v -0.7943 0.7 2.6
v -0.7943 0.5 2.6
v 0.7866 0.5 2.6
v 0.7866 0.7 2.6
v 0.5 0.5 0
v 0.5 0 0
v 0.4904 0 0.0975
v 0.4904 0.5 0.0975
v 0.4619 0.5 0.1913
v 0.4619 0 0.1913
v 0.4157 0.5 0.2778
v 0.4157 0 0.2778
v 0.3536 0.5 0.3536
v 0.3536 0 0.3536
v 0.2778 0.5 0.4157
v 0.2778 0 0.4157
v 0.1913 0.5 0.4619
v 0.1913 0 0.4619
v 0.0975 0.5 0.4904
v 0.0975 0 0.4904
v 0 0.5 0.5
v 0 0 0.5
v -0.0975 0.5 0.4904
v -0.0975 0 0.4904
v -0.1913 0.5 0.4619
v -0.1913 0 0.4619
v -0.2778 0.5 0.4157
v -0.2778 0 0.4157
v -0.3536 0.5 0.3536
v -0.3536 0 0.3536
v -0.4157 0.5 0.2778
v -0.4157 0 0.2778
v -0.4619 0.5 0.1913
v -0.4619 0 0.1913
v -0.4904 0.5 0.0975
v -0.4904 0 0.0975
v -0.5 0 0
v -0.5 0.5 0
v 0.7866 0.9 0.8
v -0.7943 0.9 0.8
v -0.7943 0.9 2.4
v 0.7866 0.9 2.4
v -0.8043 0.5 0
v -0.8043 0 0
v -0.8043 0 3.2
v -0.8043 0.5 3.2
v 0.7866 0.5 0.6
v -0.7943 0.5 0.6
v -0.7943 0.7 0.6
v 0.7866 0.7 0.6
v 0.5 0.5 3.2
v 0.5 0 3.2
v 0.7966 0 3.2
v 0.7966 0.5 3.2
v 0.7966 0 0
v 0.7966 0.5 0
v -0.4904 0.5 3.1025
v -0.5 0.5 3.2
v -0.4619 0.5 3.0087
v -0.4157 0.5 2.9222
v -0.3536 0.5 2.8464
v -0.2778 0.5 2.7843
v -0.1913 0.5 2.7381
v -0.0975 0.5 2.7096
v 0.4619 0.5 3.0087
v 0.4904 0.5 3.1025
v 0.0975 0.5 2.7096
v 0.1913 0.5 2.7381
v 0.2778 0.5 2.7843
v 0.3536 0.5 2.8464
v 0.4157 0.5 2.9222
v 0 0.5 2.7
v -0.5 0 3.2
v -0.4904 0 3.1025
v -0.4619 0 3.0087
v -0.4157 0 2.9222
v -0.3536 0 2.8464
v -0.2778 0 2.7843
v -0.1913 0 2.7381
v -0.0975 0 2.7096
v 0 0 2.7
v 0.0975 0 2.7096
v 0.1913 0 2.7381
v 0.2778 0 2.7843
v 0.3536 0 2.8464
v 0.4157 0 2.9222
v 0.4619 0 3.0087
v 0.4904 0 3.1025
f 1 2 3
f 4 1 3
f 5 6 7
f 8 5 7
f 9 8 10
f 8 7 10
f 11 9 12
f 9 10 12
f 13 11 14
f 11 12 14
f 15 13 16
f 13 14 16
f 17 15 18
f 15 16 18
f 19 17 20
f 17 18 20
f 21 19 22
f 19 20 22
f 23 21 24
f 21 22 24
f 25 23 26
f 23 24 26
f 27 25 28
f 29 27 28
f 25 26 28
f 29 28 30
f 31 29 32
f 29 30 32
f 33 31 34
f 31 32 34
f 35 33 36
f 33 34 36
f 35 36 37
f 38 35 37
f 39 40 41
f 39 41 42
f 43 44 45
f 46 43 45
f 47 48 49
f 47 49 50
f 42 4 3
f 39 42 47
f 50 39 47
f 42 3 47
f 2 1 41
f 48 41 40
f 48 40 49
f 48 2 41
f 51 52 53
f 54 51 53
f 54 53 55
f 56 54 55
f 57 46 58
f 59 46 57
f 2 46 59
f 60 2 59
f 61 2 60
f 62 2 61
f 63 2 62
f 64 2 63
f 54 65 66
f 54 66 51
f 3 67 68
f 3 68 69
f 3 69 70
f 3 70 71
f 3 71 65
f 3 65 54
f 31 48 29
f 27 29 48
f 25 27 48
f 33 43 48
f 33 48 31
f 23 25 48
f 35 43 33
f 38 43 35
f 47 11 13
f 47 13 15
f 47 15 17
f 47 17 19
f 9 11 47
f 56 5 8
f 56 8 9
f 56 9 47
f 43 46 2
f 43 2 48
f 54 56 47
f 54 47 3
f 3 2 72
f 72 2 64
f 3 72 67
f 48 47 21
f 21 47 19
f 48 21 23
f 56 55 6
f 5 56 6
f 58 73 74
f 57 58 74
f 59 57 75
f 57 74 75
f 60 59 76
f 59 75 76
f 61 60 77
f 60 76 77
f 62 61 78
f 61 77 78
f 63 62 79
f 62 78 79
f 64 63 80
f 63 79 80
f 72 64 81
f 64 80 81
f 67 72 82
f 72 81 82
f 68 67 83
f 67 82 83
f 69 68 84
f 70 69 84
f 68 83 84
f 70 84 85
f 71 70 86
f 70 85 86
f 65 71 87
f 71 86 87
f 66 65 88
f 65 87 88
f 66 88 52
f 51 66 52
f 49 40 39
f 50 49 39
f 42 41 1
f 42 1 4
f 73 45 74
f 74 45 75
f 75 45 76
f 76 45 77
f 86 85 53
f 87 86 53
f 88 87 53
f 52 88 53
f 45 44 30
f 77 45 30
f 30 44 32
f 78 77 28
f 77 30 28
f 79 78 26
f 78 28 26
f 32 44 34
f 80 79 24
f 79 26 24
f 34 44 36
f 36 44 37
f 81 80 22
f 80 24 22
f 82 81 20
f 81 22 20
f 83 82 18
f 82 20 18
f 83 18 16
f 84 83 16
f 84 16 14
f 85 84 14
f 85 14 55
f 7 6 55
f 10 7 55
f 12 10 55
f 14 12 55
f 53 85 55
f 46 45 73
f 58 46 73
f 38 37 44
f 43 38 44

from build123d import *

# Parameters (mm, degrees)
BOSS_EXTRUDE1_DEPTH = 0.5
SKETCH2_W           = 1.580979229
SKETCH2_H           = 2
BOSS_EXTRUDE3_DEPTH = 0.4
CHAMFER2_SIZE       = 0.2


with BuildPart() as part:
    # Sketch1 → Boss-Extrude1 (new body)
    with BuildSketch(Plane(origin=(0, 0, 0), x_dir=(1, 0, 0), z_dir=(0, 1, 0))):
        with BuildLine():
            Line((-0.5, 0), (-0.804342602, 0))
            Line((-0.804342602, 0), (-0.804342602, -3.2))
            Line((-0.804342602, -3.2), (-0.5, -3.2))
            ThreePointArc((-0.5, -3.2), (0, -2.7), (0.5, -3.2))
            Line((0.5, -3.2), (0.796636627, -3.2))
            Line((0.796636627, -3.2), (0.796636627, 0))
            Line((0.796636627, 0), (0.5, 0))
            ThreePointArc((0.5, 0), (0, -0.5), (-0.5, 0))
        make_face()
    extrude(amount=BOSS_EXTRUDE1_DEPTH)

    # Sketch2 → Boss-Extrude3 (add)
    with BuildSketch(Plane(origin=(0, 0.5, 0), x_dir=(1, 0, 0), z_dir=(0, 1, 0))):
        with Locations((-0.003852988, -1.6)):
            Rectangle(SKETCH2_W, SKETCH2_H)
    extrude(amount=BOSS_EXTRUDE3_DEPTH)

    # Chamfer2
    chamfer2_edges = [part.edges().sort_by_distance(p)[0] for p in [
        (-0.003852988, 0.9, 2.6),
        (-0.003852988, 0.9, 0.6),
    ]]
    chamfer(chamfer2_edges, length=CHAMFER2_SIZE)


solid = part.part
